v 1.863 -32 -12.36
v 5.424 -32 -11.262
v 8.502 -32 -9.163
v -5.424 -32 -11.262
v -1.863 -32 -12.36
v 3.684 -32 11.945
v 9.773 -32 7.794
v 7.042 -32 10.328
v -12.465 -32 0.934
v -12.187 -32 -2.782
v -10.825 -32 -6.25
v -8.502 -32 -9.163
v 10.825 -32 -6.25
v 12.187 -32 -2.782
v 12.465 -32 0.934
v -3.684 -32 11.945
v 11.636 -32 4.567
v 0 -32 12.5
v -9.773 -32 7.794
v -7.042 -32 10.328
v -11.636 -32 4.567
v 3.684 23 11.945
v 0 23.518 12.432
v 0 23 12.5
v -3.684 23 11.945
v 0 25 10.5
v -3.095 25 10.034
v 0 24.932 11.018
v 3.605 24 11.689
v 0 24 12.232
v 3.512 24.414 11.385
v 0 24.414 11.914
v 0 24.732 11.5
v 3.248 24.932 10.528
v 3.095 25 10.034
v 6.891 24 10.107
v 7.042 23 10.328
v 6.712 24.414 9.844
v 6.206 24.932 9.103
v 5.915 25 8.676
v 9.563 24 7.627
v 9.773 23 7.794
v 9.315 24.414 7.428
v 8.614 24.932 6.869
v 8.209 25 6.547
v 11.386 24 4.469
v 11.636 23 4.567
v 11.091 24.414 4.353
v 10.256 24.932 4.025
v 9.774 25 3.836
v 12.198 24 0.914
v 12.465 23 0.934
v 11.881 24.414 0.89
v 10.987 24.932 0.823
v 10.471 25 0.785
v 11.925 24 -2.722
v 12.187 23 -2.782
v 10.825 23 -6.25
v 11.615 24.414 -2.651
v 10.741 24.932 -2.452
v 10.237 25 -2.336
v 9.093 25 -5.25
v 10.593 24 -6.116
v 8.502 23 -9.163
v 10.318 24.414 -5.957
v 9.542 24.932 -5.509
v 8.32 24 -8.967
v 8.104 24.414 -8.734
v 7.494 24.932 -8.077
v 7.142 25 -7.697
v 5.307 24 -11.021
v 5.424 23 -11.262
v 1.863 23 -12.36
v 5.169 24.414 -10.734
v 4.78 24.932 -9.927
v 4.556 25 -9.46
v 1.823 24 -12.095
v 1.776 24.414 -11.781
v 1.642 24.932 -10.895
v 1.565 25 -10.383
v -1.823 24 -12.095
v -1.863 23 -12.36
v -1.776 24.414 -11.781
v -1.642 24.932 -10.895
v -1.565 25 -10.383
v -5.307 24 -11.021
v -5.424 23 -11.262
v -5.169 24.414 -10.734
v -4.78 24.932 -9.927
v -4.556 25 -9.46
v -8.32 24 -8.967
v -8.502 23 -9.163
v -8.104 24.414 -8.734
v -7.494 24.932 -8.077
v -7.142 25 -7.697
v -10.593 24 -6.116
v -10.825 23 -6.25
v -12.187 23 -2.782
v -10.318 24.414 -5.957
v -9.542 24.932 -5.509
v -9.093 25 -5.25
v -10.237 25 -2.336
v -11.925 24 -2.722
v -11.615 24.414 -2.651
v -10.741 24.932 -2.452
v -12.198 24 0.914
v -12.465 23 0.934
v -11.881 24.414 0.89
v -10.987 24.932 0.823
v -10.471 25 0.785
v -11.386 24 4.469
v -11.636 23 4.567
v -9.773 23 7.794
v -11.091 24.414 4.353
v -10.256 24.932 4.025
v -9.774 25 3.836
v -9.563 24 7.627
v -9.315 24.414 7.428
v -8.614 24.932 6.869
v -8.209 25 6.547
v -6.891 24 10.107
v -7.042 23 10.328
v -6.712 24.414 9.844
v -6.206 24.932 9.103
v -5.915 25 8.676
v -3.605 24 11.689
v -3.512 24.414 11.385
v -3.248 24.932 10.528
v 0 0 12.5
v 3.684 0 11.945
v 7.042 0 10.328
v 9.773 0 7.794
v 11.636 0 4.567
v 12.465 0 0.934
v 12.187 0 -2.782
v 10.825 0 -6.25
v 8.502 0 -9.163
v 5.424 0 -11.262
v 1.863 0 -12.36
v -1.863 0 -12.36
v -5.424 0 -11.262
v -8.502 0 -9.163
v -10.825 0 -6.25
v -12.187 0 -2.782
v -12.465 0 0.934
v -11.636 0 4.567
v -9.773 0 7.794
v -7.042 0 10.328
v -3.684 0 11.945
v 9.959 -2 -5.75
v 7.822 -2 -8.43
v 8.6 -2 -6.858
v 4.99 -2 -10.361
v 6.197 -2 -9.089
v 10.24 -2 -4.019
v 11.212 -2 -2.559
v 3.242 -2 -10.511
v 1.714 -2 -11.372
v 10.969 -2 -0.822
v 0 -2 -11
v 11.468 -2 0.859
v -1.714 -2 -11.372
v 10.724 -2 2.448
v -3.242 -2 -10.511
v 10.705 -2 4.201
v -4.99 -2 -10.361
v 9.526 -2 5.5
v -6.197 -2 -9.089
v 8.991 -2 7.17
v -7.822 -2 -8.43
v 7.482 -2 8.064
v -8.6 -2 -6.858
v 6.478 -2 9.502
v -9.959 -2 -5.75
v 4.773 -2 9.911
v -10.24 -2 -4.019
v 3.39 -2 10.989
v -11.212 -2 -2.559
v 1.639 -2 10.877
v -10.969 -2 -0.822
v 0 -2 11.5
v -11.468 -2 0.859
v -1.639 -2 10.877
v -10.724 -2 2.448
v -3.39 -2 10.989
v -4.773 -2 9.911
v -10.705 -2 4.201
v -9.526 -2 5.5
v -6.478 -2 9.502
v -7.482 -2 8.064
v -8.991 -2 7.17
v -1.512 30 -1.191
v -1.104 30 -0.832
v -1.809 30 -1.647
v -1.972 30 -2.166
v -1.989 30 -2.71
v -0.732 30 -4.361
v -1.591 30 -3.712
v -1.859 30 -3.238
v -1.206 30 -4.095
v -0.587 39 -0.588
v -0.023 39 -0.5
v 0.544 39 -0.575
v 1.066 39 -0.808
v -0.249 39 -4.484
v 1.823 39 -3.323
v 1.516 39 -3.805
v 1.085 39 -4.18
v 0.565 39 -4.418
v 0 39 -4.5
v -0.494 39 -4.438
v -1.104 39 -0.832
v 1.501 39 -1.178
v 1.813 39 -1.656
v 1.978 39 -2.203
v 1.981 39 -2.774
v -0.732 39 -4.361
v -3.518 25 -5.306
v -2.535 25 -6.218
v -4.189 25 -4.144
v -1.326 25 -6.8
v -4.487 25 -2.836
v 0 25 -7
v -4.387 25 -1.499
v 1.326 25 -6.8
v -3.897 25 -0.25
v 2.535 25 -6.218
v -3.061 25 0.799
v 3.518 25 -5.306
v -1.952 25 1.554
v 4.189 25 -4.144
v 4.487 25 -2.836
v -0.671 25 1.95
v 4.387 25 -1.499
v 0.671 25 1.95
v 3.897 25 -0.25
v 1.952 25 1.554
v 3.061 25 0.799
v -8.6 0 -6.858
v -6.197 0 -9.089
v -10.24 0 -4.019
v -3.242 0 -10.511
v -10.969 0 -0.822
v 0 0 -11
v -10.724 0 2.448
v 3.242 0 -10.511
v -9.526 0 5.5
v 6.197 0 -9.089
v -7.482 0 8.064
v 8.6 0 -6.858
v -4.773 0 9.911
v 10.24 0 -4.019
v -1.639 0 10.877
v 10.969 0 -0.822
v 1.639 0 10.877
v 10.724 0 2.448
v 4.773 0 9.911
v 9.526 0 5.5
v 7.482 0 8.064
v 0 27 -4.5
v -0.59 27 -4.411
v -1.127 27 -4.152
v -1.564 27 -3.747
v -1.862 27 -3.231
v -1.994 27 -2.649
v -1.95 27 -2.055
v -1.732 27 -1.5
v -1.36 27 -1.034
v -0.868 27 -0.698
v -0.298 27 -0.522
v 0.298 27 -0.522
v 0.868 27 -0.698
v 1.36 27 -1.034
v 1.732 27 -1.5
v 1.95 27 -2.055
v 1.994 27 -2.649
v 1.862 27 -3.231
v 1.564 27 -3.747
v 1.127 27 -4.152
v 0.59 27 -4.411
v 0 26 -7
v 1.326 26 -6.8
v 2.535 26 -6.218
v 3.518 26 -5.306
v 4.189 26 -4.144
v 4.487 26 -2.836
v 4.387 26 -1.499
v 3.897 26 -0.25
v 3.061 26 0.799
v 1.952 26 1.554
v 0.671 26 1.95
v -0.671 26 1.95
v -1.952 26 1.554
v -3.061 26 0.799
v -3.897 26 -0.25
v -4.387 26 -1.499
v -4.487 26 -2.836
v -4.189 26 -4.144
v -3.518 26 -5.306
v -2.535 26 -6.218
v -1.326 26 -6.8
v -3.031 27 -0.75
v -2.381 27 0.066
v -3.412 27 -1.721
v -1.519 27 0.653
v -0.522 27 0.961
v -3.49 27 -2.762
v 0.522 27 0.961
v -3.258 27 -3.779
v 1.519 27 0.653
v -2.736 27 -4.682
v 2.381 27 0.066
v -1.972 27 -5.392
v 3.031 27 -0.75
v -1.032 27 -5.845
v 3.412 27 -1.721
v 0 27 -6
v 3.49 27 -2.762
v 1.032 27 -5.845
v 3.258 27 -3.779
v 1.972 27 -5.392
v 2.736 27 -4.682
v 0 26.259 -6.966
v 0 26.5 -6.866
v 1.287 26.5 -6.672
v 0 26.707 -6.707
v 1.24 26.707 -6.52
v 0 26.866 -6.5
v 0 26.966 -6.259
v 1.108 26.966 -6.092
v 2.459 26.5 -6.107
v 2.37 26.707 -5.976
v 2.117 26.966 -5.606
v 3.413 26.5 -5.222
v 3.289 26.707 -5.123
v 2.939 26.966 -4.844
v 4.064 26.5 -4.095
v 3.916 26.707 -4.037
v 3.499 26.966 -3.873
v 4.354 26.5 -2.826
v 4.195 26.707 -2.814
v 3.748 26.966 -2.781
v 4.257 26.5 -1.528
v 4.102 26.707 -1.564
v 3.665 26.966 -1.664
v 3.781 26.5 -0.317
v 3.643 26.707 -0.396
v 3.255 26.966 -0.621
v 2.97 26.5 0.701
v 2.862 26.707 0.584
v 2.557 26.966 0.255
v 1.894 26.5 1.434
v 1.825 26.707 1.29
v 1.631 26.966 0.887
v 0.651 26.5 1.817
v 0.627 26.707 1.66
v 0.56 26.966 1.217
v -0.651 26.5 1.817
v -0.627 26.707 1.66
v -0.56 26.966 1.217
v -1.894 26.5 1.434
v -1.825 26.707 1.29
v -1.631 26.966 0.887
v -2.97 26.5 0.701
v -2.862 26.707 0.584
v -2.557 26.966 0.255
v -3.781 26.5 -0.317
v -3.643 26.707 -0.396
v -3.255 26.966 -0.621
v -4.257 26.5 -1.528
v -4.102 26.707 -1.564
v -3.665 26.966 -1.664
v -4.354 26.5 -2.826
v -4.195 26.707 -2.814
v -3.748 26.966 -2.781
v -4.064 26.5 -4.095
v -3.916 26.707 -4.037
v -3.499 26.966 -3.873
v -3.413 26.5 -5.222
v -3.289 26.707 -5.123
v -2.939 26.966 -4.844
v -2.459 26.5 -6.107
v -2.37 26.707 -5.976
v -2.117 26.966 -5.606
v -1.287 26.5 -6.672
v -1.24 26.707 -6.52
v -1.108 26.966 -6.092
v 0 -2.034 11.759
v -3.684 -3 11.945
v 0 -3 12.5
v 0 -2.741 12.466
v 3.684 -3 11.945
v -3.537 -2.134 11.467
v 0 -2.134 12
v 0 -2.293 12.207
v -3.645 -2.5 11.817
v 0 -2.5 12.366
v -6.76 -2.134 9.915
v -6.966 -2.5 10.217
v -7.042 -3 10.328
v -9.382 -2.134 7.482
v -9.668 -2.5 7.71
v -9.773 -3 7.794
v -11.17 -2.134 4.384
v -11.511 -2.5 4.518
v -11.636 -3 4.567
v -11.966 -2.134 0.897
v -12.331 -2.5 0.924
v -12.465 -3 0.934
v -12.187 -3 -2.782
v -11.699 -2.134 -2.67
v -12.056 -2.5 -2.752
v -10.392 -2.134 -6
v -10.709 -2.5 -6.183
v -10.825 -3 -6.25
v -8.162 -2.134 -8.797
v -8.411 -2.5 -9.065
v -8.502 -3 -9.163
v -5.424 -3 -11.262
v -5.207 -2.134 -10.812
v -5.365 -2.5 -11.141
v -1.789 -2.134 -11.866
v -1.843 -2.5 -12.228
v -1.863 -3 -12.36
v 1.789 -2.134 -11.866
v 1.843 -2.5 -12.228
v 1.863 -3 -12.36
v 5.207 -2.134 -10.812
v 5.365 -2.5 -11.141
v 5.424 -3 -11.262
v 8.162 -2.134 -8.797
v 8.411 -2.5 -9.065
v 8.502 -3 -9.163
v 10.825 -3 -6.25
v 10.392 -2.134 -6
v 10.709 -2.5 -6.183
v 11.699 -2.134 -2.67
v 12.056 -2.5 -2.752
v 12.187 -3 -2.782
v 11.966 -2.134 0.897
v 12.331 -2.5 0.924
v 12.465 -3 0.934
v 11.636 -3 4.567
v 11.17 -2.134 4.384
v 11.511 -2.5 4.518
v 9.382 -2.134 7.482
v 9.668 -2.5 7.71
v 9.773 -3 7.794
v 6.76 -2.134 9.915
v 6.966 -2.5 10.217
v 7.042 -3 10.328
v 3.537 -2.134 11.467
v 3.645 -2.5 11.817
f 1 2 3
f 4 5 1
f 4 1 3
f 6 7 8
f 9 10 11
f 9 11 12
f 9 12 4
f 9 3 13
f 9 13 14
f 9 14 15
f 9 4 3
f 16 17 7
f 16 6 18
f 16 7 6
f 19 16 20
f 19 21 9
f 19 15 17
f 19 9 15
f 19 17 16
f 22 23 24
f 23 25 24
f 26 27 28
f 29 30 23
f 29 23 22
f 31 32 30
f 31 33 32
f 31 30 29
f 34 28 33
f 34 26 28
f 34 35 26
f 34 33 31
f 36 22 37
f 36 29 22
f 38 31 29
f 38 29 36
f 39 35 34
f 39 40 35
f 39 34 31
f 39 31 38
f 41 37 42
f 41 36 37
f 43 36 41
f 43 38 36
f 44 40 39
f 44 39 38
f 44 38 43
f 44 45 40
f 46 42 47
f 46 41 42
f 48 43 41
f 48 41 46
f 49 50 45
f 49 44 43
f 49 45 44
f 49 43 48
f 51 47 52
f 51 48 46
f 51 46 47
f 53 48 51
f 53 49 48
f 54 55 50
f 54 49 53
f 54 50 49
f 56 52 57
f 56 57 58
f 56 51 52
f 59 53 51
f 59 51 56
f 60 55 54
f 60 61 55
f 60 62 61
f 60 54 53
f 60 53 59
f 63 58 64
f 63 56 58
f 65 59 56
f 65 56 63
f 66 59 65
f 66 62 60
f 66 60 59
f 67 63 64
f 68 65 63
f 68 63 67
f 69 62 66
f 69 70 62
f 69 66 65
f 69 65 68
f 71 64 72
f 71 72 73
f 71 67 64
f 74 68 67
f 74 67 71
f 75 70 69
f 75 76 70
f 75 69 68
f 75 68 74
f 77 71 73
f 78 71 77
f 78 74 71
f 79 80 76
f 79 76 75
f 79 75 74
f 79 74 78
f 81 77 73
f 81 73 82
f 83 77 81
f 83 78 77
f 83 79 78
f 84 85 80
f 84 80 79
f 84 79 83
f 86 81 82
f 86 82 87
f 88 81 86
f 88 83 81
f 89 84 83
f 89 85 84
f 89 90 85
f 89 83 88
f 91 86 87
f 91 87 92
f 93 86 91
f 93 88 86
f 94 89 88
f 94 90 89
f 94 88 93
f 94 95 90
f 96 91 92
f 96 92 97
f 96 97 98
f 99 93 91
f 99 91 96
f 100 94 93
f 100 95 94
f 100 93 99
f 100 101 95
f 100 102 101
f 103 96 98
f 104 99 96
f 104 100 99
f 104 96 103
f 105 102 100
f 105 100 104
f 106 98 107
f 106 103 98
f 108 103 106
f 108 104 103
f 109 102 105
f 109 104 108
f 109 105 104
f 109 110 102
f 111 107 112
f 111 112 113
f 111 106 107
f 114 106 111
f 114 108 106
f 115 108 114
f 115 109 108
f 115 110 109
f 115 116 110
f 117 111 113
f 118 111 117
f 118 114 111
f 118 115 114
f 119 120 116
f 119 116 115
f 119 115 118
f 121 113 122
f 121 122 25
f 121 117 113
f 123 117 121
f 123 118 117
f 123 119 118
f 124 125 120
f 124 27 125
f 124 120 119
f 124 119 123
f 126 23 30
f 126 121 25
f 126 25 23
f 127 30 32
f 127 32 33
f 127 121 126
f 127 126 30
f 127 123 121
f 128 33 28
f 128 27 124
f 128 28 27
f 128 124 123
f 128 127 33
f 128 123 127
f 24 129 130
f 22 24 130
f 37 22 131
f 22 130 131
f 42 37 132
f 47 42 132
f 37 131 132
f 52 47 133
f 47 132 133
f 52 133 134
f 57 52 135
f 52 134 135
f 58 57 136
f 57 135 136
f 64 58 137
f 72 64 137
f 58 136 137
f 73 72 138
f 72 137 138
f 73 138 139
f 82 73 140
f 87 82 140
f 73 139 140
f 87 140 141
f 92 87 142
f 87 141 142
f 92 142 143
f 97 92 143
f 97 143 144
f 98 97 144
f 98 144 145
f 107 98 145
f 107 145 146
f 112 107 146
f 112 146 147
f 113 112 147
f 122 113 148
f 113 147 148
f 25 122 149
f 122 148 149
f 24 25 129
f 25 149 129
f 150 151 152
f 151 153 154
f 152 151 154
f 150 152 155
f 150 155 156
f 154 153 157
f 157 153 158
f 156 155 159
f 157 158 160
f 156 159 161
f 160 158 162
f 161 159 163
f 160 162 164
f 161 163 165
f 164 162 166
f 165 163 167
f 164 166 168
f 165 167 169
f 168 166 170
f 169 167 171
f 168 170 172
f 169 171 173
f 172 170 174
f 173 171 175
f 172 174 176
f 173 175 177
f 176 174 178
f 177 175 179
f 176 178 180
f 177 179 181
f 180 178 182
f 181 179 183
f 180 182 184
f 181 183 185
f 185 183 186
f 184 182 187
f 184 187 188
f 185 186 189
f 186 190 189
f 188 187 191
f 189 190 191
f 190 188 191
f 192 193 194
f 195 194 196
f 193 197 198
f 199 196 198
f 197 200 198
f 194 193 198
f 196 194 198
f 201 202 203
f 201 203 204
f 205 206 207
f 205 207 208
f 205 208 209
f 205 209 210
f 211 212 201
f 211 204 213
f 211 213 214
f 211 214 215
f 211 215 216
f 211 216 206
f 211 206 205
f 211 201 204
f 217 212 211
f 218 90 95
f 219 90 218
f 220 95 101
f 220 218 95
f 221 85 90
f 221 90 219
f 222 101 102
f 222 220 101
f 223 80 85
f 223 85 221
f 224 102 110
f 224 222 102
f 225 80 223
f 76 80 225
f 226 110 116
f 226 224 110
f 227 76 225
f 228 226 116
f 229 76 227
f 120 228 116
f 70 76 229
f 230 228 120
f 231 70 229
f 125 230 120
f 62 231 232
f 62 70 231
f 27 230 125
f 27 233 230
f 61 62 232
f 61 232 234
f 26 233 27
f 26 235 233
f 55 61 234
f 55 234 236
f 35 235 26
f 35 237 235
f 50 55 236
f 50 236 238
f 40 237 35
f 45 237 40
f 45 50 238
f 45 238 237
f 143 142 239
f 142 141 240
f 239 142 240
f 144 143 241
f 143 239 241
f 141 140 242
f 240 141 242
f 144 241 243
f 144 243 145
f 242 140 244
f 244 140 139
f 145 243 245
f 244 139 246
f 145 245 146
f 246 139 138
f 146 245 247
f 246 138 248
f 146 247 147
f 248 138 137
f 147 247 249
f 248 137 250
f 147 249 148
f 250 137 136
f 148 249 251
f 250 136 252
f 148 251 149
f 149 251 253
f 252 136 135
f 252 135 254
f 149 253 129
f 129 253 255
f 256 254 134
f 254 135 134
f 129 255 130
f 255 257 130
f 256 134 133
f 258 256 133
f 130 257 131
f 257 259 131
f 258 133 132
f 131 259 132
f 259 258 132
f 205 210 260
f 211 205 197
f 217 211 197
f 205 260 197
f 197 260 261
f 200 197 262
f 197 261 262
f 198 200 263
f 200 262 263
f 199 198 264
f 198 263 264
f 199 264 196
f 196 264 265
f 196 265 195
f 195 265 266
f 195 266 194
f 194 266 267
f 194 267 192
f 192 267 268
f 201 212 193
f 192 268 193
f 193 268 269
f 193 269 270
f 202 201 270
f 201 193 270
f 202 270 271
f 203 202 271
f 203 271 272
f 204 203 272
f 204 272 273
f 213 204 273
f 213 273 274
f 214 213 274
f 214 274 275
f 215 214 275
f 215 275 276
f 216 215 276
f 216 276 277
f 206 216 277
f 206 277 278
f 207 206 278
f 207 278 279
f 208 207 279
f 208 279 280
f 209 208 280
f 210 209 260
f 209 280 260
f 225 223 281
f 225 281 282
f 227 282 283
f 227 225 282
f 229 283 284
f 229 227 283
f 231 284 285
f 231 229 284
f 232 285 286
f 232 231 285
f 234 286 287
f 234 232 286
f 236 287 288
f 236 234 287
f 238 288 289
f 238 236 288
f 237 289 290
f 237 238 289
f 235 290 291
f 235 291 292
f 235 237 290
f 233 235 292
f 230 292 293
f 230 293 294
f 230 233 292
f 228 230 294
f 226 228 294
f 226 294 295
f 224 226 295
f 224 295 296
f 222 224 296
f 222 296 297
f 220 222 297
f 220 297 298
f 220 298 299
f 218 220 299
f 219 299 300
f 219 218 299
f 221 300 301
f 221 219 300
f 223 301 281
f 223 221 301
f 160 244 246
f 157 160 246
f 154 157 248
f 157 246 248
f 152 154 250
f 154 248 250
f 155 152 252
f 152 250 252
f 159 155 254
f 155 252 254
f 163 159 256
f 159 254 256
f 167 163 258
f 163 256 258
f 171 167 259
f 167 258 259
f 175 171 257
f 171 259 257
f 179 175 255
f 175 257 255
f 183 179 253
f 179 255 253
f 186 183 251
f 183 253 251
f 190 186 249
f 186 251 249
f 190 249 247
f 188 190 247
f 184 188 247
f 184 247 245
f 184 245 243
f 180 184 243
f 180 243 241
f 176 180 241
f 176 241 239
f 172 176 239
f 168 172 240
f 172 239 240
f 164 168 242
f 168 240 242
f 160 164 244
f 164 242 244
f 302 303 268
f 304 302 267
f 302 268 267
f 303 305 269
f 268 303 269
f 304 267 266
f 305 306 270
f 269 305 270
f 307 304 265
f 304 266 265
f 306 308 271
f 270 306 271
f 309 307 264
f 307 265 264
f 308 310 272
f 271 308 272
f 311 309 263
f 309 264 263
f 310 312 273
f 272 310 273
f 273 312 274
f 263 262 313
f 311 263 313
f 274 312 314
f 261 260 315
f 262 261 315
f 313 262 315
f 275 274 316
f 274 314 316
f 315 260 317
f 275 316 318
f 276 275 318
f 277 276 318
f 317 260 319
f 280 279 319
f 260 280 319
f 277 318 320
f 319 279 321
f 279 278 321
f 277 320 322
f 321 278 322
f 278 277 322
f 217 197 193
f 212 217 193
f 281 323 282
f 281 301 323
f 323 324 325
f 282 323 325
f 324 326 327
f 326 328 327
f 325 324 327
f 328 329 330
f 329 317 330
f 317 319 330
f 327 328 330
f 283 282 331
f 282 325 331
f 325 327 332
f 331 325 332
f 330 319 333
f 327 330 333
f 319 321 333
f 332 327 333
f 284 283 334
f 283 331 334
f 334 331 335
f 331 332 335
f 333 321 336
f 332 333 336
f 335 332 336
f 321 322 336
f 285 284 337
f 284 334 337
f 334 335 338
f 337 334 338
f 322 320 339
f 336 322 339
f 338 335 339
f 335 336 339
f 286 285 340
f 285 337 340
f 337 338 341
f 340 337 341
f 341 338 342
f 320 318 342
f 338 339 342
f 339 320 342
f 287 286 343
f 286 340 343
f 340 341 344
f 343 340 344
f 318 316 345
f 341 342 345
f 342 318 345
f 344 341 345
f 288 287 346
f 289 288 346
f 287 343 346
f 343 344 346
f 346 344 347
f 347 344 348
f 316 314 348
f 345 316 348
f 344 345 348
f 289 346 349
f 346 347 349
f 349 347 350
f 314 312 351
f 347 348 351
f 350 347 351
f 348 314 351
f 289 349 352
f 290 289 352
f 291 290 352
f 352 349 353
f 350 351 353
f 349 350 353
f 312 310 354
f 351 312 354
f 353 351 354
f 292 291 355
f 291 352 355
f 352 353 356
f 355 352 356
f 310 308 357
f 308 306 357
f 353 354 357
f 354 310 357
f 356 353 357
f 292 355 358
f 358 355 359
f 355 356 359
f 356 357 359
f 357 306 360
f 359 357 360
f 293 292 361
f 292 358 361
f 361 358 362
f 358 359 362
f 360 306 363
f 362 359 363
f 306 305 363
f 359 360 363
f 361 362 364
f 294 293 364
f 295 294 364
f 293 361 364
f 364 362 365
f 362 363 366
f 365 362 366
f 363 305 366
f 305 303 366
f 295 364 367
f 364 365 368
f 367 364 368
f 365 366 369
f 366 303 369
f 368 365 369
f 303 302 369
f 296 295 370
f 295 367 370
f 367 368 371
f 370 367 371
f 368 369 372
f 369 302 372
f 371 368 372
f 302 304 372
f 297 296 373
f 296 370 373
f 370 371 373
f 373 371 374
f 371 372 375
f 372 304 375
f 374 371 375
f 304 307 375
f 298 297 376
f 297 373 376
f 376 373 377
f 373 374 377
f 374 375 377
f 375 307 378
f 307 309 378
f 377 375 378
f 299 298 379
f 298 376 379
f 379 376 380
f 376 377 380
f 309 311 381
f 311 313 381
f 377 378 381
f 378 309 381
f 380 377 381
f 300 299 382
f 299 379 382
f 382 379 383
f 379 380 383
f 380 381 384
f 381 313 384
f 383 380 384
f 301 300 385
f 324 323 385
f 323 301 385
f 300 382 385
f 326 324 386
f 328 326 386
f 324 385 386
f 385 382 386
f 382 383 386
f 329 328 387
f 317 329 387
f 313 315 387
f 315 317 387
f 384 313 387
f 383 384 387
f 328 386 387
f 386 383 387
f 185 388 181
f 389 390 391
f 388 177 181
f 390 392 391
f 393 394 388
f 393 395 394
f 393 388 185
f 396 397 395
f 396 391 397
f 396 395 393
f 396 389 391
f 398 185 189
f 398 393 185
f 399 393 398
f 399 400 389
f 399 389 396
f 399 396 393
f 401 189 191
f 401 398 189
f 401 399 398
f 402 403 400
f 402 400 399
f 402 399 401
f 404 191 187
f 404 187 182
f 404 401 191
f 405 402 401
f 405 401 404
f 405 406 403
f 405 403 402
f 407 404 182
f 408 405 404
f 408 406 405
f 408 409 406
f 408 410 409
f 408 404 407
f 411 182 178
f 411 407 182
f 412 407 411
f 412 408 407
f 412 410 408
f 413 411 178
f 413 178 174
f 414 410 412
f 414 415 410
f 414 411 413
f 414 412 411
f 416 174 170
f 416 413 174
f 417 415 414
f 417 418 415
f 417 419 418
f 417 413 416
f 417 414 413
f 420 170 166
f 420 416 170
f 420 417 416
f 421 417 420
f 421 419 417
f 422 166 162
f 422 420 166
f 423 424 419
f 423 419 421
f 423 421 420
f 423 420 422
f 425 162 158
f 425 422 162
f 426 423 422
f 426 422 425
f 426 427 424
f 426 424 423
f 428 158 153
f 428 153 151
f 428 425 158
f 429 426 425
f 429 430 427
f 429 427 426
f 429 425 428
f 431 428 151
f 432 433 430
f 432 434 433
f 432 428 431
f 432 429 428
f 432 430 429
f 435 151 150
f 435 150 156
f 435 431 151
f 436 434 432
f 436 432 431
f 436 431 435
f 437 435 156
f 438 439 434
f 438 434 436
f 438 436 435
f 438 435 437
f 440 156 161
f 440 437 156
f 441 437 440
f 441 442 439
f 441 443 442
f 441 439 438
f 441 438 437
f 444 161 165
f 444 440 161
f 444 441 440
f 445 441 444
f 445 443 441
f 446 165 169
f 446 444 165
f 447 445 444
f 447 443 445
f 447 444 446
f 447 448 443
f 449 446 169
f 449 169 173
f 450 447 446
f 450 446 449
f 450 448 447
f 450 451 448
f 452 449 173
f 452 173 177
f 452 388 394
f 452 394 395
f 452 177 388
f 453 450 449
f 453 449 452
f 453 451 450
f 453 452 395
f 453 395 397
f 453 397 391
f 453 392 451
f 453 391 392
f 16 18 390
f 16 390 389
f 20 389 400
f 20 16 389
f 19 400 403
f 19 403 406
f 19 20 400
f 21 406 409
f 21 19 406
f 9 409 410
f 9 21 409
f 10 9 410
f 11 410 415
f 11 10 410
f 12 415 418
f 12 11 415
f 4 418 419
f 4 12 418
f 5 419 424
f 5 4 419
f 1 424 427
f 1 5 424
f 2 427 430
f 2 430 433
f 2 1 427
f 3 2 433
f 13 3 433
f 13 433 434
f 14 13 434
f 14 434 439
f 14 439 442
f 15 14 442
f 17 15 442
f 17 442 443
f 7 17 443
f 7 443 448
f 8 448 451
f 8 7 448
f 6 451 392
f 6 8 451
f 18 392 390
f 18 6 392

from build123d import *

# Parameters (mm, degrees)
SKETCH1_R           = 12.5
BOSS_EXTRUDE1_DEPTH = 25
SKETCH2_R           = 11
BOSS_EXTRUDE2_DEPTH = 2
BOSS_EXTRUDE3_START = 30
SKETCH3_R           = 12.5
BOSS_EXTRUDE3_DEPTH = 30
SKETCH4_R           = 4.5
BOSS_EXTRUDE4_DEPTH = 2
FILLET1_R           = 2
FILLET2_R           = 1
FILLET3_R           = 1
SKETCH5_R           = 2
BOSS_EXTRUDE5_DEPTH = 12
CUT_EXTRUDE1_START  = -9
CUT_EXTRUDE1_DEPTH  = 9


with BuildPart() as part:
    # Sketch1 → Boss-Extrude1 (new body)
    with BuildSketch(Plane(origin=(0, 0, 0), x_dir=(1, 0, 0), z_dir=(0, 1, 0))):
        with Locations(Location((0, 0, 0), (0, 0, 270))):
            Circle(SKETCH1_R)
    extrude(amount=BOSS_EXTRUDE1_DEPTH)

    # Sketch2 → Boss-Extrude2 (add)
    with BuildSketch(Plane.XZ):
        with Locations(Location((0, 0, 0), (0, 0, 270))):
            Circle(SKETCH2_R)
    extrude(amount=BOSS_EXTRUDE2_DEPTH)

    # Sketch3 → Boss-Extrude3 (add)
    with BuildSketch(Plane.XZ.offset(2).offset(BOSS_EXTRUDE3_START)):
        with Locations(Location((0, 0, 0), (0, 0, 90))):
            Circle(SKETCH3_R)
    extrude(amount=-BOSS_EXTRUDE3_DEPTH)

    # Sketch4 → Boss-Extrude4 (add)
    with BuildSketch(Plane.XZ.offset(-25)):
        with Locations(Location((0, -2.5, 0), (0, 0, 270))):
            Circle(SKETCH4_R)
    extrude(amount=-BOSS_EXTRUDE4_DEPTH)

    # Fillet1
    fillet1_edges = [part.edges().sort_by_distance(p)[0] for p in [
        (0, 25, -12.5),
    ]]
    fillet(fillet1_edges, radius=FILLET1_R)

    # Fillet2
    fillet2_edges = [part.edges().sort_by_distance(p)[0] for p in [
        (0, -2, -12.5),
    ]]
    fillet(fillet2_edges, radius=FILLET2_R)

    # Fillet3
    fillet3_edges = [part.edges().sort_by_distance(p)[0] for p in [
        (0, 27, 2),
    ]]
    fillet(fillet3_edges, radius=FILLET3_R)

    # Sketch5 → Boss-Extrude5 (add)
    with BuildSketch(Plane(origin=(0, 27, 0), x_dir=(1, 0, 0), z_dir=(0, 1, 0))):
        with Locations(Location((0, 2.5, 0), (0, 0, 90))):
            Circle(SKETCH5_R)
    extrude(amount=BOSS_EXTRUDE5_DEPTH)

    # Sketch10 → Cut-Extrude1 (cut)
    with BuildSketch(Plane(origin=(0, 39, 0), x_dir=(1, 0, 0), z_dir=(0, 1, 0)).offset(CUT_EXTRUDE1_START)):
        with BuildLine():
            Line((-0.731515286, 4.361420261), (-1.103703337, 0.832115428))
            ThreePointArc((-1.103703337, 0.832115428), (-1.988970839, 2.709749856), (-0.731515286, 4.361420261))
        make_face()
    extrude(amount=CUT_EXTRUDE1_DEPTH, mode=Mode.SUBTRACT)


solid = part.part
